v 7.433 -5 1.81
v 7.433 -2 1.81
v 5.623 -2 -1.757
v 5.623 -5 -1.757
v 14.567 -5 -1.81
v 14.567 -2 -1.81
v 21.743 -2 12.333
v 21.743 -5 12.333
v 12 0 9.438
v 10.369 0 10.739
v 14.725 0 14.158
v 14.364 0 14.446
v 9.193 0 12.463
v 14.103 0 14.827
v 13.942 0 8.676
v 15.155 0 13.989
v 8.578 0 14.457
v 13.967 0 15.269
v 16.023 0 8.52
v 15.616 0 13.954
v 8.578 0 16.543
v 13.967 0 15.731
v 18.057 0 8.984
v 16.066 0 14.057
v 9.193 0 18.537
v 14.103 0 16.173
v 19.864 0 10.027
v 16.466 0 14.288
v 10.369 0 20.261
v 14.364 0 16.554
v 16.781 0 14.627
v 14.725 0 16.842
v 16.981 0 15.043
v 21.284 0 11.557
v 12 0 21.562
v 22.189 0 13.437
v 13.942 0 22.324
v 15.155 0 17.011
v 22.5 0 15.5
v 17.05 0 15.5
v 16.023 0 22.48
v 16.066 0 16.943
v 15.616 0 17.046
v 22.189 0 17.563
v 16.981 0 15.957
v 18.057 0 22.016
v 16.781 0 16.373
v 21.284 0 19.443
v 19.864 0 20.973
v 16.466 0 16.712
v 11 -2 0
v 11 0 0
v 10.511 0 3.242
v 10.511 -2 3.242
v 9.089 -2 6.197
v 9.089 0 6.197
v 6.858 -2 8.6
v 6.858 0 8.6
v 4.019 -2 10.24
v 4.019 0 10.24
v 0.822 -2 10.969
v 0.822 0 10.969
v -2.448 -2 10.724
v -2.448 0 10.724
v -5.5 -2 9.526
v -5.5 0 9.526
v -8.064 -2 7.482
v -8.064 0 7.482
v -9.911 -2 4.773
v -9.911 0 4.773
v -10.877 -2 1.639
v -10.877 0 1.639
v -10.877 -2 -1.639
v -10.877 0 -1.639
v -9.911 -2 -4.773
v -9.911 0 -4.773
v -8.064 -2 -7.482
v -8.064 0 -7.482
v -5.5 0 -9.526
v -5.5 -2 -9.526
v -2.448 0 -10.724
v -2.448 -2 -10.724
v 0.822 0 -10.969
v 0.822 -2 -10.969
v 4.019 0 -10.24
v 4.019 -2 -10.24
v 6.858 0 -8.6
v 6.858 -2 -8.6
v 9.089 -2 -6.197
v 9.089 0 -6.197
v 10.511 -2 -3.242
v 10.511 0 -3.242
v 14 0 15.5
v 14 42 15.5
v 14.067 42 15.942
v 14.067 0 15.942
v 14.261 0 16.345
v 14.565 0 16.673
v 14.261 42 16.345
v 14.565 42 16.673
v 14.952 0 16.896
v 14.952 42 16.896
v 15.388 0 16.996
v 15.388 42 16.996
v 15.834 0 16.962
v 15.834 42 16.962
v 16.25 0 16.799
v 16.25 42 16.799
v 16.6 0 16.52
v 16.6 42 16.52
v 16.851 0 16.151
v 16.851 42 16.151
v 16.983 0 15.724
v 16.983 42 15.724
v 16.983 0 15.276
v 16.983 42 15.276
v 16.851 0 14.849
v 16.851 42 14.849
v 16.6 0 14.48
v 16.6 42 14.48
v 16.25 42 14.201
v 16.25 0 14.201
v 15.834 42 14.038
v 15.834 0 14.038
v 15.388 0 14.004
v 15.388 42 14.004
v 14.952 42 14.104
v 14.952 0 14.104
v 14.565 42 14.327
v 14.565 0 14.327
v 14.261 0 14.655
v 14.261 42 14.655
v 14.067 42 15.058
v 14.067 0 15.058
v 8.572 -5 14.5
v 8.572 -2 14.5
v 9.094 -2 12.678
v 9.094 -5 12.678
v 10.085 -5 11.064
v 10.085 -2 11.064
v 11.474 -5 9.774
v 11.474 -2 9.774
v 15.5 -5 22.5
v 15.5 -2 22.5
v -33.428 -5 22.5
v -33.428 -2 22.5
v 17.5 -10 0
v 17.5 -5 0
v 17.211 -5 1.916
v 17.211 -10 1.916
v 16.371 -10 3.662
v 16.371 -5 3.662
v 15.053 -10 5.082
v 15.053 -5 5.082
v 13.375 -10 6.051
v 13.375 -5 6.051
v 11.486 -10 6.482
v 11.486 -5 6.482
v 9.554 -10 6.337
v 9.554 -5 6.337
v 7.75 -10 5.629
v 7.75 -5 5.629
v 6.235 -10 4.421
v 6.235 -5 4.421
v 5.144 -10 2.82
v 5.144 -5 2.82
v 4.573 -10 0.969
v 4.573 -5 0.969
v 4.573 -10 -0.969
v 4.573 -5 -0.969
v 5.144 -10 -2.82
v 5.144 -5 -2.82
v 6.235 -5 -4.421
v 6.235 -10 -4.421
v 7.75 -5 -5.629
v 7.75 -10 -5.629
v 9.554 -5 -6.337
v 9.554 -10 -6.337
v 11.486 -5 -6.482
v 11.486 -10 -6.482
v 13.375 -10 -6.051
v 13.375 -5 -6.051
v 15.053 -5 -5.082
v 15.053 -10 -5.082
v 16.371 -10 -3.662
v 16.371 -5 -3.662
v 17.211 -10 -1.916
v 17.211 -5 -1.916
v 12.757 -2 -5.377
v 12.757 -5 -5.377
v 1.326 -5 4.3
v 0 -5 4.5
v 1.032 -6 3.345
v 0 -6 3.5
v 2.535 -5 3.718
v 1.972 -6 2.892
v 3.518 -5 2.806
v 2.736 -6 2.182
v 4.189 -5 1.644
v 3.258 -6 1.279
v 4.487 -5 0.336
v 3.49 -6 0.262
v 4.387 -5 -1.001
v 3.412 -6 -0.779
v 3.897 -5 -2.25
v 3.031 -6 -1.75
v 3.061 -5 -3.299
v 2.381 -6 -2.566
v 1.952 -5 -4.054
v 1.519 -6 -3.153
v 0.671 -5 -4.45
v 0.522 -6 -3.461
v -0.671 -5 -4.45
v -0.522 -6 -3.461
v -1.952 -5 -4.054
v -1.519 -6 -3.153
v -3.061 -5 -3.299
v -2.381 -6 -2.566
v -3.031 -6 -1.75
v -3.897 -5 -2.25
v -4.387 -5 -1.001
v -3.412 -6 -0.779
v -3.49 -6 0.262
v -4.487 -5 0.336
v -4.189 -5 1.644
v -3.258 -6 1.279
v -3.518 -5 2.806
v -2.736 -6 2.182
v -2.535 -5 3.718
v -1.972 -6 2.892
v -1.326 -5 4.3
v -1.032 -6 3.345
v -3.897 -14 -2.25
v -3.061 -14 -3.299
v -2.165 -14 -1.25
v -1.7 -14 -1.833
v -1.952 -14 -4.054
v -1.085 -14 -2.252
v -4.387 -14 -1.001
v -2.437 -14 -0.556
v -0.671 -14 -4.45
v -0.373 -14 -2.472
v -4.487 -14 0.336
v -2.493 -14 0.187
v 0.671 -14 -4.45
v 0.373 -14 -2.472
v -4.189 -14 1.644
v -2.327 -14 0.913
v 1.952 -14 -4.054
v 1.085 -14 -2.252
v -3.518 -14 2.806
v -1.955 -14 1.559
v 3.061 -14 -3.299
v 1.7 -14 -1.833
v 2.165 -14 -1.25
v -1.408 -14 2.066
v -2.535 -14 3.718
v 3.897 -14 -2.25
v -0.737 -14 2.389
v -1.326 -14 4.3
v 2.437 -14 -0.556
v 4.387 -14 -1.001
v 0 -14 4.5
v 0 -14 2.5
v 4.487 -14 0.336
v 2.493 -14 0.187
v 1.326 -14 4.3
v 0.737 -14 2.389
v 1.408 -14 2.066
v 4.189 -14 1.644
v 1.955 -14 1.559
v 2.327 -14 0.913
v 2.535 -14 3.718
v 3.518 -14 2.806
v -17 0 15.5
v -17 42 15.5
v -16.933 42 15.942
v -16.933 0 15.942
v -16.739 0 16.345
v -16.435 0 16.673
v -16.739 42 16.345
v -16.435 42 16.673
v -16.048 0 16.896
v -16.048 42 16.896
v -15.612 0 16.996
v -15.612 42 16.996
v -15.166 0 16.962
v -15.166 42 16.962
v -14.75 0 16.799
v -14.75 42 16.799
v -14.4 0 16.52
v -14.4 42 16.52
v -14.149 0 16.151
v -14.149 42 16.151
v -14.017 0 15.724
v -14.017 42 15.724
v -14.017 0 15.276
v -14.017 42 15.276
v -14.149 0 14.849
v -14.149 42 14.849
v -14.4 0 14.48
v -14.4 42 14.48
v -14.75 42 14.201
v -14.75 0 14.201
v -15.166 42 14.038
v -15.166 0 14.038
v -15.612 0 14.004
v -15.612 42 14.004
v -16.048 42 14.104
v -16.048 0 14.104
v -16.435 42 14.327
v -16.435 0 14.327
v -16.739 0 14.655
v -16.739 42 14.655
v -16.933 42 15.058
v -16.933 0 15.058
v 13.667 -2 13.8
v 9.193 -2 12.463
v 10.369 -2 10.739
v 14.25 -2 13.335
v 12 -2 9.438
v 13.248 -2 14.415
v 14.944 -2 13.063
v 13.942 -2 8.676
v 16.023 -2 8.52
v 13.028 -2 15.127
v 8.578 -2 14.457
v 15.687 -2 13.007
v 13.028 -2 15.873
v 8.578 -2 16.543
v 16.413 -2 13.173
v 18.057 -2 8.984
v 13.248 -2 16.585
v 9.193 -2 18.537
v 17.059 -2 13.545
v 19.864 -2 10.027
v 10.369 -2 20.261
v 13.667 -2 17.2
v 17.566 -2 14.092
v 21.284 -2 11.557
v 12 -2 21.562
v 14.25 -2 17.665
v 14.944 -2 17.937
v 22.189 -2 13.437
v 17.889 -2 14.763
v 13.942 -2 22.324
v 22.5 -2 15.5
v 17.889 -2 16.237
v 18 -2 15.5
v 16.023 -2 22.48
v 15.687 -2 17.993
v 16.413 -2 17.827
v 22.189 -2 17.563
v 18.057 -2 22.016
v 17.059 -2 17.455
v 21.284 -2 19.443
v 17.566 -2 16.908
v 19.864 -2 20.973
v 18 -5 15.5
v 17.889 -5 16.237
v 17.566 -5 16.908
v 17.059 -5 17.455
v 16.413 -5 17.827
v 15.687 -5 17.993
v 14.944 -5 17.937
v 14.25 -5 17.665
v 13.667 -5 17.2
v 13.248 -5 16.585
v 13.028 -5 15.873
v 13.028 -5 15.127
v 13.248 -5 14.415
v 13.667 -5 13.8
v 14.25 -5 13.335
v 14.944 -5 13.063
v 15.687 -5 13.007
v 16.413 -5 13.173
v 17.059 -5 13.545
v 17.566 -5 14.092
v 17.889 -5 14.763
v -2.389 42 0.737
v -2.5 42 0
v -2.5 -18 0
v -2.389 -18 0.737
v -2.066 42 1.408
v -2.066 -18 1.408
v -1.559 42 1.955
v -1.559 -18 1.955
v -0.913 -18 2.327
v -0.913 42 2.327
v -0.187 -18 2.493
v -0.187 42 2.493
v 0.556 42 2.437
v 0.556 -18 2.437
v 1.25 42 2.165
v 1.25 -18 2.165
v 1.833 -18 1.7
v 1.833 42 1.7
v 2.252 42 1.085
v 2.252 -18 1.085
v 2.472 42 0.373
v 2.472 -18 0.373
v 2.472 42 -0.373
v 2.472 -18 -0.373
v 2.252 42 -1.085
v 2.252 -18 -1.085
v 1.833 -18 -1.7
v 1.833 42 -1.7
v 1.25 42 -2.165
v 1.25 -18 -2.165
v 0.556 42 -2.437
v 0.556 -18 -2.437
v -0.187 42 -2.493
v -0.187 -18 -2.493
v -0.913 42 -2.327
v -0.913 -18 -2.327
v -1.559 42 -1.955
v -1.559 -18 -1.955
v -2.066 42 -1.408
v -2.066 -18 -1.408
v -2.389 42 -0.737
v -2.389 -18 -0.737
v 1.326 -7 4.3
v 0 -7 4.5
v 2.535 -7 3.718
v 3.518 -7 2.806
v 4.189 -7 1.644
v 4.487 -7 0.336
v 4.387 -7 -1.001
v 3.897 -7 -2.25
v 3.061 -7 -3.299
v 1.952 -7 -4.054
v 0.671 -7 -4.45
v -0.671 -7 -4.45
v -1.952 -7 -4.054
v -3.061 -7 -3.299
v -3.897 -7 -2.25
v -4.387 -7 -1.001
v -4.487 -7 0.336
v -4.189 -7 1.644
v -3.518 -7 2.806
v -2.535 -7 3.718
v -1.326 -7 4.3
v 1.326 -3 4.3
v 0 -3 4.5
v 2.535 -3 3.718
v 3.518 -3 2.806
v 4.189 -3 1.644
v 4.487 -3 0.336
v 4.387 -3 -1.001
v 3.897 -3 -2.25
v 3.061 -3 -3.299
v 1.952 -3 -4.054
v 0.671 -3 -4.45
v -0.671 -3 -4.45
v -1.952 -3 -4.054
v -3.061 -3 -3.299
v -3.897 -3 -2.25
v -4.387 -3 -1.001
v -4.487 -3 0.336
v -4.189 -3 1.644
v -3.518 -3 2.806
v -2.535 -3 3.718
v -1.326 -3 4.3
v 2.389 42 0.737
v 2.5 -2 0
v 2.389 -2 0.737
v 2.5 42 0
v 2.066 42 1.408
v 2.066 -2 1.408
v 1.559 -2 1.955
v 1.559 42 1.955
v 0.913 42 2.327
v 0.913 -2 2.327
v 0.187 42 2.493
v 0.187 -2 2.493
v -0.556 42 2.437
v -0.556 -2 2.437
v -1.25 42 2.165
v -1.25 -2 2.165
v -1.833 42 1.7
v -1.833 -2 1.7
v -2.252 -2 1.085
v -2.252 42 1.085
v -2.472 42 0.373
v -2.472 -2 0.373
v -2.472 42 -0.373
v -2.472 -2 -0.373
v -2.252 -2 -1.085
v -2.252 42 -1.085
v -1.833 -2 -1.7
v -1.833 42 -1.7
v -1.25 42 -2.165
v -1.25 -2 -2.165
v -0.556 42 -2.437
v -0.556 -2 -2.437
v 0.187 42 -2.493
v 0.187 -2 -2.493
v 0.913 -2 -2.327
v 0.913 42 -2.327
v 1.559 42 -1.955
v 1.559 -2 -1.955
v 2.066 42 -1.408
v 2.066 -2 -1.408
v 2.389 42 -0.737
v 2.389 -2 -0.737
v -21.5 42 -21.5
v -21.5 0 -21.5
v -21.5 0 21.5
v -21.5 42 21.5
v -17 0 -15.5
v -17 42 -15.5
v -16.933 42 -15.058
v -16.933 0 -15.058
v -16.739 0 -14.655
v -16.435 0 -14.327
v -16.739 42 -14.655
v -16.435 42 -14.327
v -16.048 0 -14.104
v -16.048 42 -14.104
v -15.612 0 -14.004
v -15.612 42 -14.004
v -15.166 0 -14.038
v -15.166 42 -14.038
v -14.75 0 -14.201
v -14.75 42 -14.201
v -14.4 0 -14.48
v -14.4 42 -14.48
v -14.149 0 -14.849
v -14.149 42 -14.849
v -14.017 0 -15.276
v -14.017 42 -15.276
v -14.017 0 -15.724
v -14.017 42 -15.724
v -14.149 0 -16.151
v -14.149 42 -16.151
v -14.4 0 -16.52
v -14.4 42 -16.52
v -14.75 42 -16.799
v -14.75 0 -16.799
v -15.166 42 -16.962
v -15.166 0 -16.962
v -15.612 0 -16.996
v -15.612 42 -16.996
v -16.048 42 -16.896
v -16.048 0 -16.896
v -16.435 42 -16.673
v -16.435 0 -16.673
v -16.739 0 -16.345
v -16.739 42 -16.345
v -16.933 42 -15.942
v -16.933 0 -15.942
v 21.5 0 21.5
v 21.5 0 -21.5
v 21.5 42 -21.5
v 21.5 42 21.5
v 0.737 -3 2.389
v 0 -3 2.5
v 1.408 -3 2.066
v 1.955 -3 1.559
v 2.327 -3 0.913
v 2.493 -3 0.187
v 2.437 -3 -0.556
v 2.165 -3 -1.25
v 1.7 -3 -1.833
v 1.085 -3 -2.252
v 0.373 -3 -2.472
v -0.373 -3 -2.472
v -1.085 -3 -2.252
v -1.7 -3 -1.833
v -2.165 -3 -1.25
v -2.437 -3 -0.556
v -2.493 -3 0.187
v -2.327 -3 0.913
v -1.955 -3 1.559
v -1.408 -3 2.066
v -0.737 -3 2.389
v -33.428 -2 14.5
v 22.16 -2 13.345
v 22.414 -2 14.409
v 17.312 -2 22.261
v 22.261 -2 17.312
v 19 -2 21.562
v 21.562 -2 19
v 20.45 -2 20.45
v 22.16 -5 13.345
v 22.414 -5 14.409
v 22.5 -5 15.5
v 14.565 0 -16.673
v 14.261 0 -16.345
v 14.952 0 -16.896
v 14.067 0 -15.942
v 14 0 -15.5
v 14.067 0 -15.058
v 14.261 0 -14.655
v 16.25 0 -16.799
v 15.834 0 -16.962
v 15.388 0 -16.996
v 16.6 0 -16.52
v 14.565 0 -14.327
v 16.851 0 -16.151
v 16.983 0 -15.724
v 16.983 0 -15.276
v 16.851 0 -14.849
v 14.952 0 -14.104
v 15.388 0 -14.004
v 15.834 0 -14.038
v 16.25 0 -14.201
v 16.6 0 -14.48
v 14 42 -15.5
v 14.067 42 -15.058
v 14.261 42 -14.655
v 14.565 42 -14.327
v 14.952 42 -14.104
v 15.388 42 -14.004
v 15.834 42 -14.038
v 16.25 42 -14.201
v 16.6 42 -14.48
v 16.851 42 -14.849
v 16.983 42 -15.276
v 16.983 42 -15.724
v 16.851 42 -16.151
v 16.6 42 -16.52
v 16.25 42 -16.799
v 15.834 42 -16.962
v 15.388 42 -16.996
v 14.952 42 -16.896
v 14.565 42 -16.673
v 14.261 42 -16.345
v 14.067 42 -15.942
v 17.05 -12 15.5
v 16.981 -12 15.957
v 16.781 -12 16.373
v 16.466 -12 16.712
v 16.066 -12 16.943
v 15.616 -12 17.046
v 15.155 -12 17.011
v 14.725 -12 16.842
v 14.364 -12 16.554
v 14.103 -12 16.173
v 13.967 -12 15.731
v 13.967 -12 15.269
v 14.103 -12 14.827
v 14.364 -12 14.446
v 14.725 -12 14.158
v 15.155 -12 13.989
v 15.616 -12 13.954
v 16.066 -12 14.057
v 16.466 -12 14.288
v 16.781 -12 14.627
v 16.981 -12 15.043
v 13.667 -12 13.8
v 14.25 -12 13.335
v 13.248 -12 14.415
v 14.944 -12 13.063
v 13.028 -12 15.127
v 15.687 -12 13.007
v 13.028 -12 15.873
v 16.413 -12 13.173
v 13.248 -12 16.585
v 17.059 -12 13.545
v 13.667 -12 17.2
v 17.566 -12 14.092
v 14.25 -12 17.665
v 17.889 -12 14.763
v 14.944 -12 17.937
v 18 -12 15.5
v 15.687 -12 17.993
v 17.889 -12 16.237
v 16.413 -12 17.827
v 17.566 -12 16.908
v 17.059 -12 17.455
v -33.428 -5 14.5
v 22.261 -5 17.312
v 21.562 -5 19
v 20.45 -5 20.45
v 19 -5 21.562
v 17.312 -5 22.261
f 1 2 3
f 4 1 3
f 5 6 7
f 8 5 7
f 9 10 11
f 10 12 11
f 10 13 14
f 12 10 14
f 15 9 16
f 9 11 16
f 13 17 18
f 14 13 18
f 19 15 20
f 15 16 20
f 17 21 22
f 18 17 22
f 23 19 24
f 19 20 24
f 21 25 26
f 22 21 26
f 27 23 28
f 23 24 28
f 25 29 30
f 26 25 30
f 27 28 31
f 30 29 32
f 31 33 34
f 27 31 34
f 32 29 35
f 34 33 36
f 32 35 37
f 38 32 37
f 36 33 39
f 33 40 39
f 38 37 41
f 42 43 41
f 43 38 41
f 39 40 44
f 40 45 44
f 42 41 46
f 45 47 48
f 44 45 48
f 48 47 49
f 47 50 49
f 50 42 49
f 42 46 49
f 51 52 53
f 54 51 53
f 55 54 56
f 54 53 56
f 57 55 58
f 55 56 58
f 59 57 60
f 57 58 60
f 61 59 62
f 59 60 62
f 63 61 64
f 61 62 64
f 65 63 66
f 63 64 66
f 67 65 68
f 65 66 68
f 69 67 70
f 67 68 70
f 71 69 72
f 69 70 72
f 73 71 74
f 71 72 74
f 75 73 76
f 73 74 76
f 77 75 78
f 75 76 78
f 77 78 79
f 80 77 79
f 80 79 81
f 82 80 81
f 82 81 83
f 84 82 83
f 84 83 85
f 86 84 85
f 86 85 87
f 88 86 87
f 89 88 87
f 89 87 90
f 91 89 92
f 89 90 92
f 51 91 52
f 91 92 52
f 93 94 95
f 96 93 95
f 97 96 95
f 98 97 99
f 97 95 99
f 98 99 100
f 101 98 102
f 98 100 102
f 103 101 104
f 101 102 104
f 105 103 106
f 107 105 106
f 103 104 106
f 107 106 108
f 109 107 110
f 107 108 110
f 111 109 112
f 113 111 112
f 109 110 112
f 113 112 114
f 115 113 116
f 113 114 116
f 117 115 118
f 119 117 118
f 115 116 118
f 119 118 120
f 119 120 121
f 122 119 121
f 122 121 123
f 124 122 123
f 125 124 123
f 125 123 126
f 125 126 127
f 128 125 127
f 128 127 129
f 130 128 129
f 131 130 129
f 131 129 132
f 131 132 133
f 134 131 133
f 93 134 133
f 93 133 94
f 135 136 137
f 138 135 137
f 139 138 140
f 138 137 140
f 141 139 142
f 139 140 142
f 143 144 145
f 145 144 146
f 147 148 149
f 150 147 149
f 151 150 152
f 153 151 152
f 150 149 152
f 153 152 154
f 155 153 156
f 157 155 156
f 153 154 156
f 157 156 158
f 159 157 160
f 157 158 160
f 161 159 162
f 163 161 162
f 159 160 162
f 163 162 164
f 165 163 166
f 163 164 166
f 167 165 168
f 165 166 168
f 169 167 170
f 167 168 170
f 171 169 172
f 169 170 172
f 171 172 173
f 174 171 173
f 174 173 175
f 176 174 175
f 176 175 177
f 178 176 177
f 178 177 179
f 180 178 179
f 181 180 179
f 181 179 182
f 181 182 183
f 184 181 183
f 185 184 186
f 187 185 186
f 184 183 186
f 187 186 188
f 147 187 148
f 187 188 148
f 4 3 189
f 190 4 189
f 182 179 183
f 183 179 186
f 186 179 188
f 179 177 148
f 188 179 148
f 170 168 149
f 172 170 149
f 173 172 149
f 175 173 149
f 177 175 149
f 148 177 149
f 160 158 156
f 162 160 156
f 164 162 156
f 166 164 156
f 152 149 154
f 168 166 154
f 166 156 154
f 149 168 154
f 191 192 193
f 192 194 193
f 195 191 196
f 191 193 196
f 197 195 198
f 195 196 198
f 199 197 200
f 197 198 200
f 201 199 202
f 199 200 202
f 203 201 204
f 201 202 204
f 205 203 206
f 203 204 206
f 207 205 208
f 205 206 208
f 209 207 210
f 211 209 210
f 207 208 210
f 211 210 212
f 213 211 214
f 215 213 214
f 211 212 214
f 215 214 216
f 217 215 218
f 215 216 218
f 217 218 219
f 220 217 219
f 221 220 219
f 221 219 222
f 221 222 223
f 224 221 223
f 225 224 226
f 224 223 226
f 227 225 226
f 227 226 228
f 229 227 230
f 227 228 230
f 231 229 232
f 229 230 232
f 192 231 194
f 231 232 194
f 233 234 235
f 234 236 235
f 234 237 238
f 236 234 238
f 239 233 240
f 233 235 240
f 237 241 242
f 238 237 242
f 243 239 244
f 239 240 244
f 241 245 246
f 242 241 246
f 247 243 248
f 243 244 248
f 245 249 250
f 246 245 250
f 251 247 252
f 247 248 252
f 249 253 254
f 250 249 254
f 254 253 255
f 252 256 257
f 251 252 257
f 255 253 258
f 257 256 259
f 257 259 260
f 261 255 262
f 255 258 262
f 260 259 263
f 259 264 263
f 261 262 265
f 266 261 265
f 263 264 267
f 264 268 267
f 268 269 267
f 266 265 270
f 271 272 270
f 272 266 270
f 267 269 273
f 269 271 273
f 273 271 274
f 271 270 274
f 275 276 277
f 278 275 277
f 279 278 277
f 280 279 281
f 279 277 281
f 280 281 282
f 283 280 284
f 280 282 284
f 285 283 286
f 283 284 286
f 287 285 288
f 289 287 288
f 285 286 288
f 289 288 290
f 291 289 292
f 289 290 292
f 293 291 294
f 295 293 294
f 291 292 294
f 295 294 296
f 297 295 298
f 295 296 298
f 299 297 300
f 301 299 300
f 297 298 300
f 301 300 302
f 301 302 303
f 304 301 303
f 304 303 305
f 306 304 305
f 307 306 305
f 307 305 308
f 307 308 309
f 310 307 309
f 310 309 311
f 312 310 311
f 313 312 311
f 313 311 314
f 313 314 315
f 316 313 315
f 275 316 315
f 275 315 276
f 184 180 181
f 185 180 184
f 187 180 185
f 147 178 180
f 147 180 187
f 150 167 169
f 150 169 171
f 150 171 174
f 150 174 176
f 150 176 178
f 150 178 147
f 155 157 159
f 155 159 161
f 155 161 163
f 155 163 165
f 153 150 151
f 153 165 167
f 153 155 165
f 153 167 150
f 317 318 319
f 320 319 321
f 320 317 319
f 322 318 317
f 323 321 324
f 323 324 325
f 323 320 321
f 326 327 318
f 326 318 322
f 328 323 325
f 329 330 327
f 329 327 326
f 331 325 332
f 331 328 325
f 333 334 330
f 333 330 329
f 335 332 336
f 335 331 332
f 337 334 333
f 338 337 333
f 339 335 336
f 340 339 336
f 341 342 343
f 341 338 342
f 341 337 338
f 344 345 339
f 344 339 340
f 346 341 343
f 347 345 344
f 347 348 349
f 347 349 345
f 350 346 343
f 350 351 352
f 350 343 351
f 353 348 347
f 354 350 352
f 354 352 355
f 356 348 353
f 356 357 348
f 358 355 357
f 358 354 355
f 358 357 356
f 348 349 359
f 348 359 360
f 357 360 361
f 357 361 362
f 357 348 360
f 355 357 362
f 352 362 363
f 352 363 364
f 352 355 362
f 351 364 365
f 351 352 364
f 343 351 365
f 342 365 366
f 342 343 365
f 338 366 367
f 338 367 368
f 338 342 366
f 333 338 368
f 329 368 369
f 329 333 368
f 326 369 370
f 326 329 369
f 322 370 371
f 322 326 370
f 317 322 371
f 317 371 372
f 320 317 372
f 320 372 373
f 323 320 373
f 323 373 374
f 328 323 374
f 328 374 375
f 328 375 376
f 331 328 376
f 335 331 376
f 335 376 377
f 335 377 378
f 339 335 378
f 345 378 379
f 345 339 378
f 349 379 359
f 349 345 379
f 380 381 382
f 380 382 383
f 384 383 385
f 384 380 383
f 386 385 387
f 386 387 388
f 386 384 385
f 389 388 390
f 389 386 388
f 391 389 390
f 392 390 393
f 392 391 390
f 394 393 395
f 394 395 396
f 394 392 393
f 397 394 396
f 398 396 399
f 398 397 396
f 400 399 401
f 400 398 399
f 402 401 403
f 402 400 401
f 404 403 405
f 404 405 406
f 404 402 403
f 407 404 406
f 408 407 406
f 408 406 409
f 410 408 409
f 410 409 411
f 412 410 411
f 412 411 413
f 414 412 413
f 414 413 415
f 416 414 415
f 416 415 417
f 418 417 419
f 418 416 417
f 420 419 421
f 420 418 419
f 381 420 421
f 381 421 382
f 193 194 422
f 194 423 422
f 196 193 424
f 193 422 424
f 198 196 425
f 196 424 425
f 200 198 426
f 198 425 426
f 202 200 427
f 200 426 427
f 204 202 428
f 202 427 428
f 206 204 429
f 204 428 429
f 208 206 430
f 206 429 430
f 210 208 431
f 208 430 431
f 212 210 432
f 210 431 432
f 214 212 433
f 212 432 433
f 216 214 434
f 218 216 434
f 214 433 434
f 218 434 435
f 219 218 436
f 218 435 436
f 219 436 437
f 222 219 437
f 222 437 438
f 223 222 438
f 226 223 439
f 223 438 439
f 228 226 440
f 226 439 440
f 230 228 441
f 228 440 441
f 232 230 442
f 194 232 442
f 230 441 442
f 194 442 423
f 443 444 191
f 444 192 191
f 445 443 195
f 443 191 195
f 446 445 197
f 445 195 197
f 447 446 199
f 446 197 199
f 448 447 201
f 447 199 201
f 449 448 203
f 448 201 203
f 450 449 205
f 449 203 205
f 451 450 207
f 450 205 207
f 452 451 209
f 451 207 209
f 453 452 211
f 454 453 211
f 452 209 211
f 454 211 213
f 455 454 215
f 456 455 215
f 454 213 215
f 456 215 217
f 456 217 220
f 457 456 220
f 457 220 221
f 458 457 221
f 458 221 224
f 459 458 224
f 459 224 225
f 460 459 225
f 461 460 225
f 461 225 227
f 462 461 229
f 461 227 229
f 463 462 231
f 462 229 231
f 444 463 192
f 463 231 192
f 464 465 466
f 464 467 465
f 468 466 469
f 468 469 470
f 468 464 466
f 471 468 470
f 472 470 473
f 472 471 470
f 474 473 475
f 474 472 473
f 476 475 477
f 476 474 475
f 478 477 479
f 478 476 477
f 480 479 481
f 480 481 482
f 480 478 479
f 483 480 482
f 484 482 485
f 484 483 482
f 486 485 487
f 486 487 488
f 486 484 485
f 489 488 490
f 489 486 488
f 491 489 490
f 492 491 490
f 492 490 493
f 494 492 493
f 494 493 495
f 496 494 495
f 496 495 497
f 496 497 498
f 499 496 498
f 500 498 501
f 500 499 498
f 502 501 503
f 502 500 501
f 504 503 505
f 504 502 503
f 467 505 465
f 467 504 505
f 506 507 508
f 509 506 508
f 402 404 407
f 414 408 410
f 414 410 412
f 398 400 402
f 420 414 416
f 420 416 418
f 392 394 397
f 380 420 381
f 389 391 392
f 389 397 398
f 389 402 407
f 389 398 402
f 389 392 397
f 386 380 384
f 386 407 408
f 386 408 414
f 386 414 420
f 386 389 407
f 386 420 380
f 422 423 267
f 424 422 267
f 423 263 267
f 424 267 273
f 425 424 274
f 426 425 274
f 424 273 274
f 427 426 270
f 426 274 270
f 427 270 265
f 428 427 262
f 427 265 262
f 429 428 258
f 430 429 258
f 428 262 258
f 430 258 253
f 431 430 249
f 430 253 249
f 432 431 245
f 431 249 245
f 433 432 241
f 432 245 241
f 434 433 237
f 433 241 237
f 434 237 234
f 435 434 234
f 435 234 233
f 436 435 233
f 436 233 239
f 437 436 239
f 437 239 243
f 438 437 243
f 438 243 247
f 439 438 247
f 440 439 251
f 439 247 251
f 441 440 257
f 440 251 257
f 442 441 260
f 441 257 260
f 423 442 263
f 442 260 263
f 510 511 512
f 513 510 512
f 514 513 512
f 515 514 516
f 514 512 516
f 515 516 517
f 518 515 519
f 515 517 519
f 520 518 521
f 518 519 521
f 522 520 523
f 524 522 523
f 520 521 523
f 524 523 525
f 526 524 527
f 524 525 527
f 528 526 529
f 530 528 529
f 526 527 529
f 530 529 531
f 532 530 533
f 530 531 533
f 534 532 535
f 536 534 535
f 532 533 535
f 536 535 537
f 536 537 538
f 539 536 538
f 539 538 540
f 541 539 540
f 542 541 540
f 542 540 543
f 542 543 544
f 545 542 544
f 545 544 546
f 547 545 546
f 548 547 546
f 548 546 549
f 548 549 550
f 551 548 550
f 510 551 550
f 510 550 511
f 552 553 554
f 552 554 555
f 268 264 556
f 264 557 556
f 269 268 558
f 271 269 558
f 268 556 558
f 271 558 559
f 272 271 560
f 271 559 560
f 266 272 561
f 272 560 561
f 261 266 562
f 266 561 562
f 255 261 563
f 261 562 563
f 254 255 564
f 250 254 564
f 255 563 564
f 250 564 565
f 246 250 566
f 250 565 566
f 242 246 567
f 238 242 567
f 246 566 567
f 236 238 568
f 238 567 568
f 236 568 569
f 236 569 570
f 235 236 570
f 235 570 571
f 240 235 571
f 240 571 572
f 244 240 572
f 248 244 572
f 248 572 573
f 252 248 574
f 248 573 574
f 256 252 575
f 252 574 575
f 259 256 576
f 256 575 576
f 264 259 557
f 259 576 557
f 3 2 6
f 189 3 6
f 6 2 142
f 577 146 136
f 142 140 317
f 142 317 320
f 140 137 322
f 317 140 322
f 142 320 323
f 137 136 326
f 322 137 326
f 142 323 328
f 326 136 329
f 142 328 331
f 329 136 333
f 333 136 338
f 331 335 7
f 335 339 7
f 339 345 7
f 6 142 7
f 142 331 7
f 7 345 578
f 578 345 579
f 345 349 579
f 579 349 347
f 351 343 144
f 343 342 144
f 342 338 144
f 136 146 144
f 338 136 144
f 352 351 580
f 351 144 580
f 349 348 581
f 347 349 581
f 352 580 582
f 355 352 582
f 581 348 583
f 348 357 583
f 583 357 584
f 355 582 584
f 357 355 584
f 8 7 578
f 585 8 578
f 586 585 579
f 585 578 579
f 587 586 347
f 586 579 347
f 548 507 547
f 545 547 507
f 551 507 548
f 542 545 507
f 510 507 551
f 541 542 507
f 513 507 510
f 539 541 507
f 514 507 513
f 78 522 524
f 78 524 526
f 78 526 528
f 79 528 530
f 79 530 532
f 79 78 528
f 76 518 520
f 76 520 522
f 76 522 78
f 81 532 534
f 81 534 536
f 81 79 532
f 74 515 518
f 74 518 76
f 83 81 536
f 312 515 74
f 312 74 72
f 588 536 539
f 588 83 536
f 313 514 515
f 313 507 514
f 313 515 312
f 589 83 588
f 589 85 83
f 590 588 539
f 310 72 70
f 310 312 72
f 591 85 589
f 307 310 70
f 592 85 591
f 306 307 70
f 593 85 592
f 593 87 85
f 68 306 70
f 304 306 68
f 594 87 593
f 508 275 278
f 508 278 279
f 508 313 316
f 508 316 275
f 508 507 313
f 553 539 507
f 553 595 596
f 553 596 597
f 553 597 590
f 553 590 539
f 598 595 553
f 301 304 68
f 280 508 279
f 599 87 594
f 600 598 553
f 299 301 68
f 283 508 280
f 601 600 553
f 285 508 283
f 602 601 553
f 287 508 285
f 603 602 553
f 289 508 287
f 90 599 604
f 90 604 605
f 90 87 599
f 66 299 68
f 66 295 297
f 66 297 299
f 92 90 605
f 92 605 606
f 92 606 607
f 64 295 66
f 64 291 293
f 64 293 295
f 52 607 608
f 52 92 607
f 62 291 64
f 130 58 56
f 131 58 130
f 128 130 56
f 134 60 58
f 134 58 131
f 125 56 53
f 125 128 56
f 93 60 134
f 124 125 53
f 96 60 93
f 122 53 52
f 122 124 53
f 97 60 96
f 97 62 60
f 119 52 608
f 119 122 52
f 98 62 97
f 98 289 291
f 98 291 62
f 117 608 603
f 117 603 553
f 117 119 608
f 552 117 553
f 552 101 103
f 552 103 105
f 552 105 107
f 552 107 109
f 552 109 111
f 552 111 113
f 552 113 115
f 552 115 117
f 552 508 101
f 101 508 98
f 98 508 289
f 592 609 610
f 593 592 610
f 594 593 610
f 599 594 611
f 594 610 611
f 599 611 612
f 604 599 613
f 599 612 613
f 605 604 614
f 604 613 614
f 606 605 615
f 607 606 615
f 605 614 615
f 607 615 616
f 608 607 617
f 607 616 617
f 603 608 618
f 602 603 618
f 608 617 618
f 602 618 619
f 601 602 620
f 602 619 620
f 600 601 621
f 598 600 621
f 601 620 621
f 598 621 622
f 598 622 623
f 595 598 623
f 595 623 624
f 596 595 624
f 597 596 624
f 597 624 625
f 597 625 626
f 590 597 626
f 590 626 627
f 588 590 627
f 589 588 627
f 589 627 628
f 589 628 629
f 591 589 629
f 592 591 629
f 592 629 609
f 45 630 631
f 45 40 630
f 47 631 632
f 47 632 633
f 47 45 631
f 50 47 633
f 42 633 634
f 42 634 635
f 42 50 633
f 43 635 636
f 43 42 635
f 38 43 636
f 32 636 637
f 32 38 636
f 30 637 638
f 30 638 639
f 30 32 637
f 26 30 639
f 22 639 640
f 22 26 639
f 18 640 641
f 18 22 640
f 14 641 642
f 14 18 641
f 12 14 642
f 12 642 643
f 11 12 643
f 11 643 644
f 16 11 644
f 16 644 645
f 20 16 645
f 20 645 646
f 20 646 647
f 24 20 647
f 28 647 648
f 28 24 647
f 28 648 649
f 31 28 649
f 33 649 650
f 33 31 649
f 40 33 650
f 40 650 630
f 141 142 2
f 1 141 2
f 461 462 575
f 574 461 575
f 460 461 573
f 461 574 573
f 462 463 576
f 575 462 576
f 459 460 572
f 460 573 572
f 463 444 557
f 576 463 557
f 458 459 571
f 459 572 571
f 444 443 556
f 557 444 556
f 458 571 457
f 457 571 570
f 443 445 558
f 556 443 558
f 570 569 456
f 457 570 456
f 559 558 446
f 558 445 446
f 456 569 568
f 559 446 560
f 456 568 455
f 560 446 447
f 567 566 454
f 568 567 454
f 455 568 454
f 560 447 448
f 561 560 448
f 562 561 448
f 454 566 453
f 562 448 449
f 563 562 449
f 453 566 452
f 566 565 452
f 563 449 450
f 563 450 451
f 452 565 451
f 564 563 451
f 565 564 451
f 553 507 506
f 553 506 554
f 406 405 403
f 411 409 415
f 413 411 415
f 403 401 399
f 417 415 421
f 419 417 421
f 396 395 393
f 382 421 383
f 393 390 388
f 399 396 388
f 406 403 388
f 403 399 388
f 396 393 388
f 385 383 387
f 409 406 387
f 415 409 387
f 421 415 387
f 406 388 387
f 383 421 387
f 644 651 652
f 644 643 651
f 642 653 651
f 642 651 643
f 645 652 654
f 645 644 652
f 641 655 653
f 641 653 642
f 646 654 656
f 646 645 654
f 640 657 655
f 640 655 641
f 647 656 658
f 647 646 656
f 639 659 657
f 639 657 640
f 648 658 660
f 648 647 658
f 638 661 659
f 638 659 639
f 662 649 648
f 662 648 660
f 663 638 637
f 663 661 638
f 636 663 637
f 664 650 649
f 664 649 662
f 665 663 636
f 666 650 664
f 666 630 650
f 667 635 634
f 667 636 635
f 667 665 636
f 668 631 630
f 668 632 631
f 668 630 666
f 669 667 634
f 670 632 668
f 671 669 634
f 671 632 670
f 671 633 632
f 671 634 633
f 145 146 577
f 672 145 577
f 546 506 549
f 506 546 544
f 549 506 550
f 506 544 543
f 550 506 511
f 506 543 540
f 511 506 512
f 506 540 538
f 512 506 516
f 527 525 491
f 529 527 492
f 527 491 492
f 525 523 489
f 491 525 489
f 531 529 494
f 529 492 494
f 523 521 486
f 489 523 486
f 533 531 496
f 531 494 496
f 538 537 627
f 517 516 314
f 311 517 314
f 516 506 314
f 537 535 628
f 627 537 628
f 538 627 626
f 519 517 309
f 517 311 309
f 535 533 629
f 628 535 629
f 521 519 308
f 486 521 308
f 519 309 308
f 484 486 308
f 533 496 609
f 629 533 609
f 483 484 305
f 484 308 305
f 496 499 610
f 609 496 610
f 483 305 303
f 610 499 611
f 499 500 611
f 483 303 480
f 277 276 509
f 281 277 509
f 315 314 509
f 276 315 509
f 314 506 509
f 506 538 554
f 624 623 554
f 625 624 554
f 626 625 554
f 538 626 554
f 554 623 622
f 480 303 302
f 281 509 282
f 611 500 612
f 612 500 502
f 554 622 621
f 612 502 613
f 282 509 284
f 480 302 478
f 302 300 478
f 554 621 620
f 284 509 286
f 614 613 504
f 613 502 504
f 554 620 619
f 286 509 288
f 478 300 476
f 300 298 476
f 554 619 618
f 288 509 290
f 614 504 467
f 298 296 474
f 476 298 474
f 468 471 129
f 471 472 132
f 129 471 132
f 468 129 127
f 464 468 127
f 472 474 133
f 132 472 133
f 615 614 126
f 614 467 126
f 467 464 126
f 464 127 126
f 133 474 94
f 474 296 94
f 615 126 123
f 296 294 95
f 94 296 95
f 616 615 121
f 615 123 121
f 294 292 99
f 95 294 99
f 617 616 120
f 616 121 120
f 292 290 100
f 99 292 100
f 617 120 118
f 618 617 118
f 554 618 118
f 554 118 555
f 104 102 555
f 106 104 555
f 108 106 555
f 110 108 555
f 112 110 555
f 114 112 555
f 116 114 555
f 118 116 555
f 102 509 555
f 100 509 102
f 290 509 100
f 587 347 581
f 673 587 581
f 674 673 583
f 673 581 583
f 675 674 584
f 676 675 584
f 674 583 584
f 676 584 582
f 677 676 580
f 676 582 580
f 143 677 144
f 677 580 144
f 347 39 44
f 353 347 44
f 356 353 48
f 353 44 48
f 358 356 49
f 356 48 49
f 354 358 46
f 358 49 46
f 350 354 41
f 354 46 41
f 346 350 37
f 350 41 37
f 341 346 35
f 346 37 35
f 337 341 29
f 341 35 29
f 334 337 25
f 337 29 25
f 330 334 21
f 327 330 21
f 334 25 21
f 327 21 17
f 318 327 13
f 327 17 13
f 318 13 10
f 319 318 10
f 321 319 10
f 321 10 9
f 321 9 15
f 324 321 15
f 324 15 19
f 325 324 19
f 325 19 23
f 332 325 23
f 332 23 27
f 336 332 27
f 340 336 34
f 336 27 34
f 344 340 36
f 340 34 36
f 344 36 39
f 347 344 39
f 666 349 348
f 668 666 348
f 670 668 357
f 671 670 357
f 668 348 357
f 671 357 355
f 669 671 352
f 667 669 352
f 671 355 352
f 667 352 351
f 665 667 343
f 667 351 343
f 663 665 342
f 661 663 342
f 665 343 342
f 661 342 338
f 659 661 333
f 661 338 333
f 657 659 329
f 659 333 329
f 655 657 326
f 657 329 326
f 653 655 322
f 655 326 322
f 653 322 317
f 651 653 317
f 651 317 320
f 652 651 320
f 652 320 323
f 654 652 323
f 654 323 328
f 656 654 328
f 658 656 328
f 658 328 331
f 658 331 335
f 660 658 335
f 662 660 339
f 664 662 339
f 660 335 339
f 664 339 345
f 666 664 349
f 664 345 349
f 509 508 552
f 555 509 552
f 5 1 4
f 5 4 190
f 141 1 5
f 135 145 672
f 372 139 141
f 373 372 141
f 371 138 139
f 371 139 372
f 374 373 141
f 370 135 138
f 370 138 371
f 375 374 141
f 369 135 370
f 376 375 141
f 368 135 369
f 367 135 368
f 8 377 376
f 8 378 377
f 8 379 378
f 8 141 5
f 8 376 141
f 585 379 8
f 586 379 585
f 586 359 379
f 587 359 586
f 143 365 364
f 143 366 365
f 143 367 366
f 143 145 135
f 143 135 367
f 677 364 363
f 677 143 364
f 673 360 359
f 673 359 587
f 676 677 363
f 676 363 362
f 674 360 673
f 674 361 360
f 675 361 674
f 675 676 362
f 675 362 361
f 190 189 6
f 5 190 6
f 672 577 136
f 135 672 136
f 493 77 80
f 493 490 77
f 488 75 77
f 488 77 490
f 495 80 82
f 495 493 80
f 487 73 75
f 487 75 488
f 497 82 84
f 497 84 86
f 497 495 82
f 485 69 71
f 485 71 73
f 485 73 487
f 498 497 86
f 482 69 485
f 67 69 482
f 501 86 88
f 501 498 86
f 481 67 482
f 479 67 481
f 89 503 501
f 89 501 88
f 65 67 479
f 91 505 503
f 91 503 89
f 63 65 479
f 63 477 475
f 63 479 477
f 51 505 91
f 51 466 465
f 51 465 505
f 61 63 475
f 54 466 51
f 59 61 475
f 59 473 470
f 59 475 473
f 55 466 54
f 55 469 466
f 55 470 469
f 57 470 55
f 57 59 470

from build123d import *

# Parameters (mm, degrees)
F0_W      = 43
F0_H      = 43
F0_R      = 2.5
F1_DEPTH  = 42
F2_R      = 11
F2_R_2    = 2.5
F3_DEPTH  = 2
F4_D      = 3
F5_R      = 2.5
F6_DEPTH  = 60
F11_R     = 7
F11_R_2   = 1.55
F12_DEPTH = 2
F13_R     = 2.5
F13_R_2   = 1.55
F14_DEPTH = 10
F15_R     = 2.5
F16_DEPTH = 3
F17_R     = 6.5
F18_DEPTH = 5


with BuildPart() as f1:
    # F0 (on Front) → F1 (new body)
    with BuildSketch(Plane.XZ):
        Rectangle(F0_W, F0_H)
        Circle(F0_R, mode=Mode.SUBTRACT)
    extrude(amount=-F1_DEPTH)

    # F2 (on face) → F3 (join)
    with BuildSketch(Plane.XZ):
        Circle(F2_R)
        Circle(F2_R_2, mode=Mode.SUBTRACT)
    extrude(amount=F3_DEPTH)

    # F4 (through all)
    with Locations(Plane.XZ):
        with Locations((-15.5, 15.5), (15.5, 15.5), (15.5, -15.5), (-15.5, -15.5)):
            Hole(F4_D / 2)


with BuildPart() as f6:
    # F5 (on face) → F6 (new body)
    with BuildSketch(Plane(origin=(0, 42, 0), x_dir=(-1, 0, 0), z_dir=(0, 1, 0))):
        Circle(F5_R)
    extrude(amount=-F6_DEPTH)


with BuildPart() as f10:
    # F9 (on Right) → F10 (revolve)
    with BuildSketch(Plane.YZ):
        Polygon((-14, 2.5), (-3, 2.5), (-3, 4.5), (-5, 4.5), (-6, 3.5), (-7, 4.5), (-14, 4.5), align=None)
    revolve(axis=Axis((0, -18, 0), (0, 1, 0)))


with BuildPart() as f12:
    # F11 (on face) → F12 (new body)
    with BuildSketch(Plane.XZ):
        with Locations((15.5, 15.5)):
            Circle(F11_R)
        with Locations((15.5, 15.5)):
            Circle(F11_R_2, mode=Mode.SUBTRACT)
    extrude(amount=F12_DEPTH)

    # F13 (on face) → F14 (join)
    with BuildSketch(Plane.XZ.offset(2)):
        with Locations((15.5, 15.5)):
            Circle(F13_R)
        with Locations((15.5, 15.5)):
            Circle(F13_R_2, mode=Mode.SUBTRACT)
    extrude(amount=F14_DEPTH)


with BuildPart() as f16:
    # F15 (on face) → F16 (new body)
    with BuildSketch(Plane.XZ.offset(2)):
        with BuildLine():
            ThreePointArc((21.742513, 12.332819), (22.307995, 13.871748), (22.5, 15.5))
            ThreePointArc((22.5, 15.5), (20.449747, 20.449747), (15.5, 22.5))
            ThreePointArc((15.5, 22.5), (10.208497, 20.082576), (8.571797, 14.5))
            ThreePointArc((8.571797, 14.5), (9.534672, 11.837369), (11.473516, 9.773969))
            ThreePointArc((11.473516, 9.773969), (17.19252, 8.707697), (21.742513, 12.332819))
        make_face()
        with Locations((15.5, 15.5)):
            Circle(F15_R, mode=Mode.SUBTRACT)
        with BuildLine():
            ThreePointArc((8.571797, 14.5), (10.208497, 20.082576), (15.5, 22.5))
            Line((15.5, 22.5), (-33.428203, 22.5))
            Line((-33.428203, 22.5), (-33.428203, 14.5))
            Line((-33.428203, 14.5), (8.571797, 14.5))
        make_face()
        with BuildLine():
            Line((14.56715, -1.809818), (21.742513, 12.332819))
            ThreePointArc((21.742513, 12.332819), (17.19252, 8.707697), (11.473516, 9.773969))
            Line((11.473516, 9.773969), (7.43285, 1.809818))
            Line((7.43285, 1.809818), (5.623032, -1.757332))
            Line((5.623032, -1.757332), (12.757332, -5.376968))
            Line((12.757332, -5.376968), (14.56715, -1.809818))
        make_face()
    extrude(amount=F16_DEPTH)


with BuildPart() as f18:
    # F17 (on face) → F18 (new body)
    with BuildSketch(Plane.XZ.offset(5)):
        with Locations((11, 0)):
            Circle(F17_R)
    extrude(amount=F18_DEPTH)


solid = Compound([f1.part, f6.part, f10.part, f12.part, f16.part, f18.part])
